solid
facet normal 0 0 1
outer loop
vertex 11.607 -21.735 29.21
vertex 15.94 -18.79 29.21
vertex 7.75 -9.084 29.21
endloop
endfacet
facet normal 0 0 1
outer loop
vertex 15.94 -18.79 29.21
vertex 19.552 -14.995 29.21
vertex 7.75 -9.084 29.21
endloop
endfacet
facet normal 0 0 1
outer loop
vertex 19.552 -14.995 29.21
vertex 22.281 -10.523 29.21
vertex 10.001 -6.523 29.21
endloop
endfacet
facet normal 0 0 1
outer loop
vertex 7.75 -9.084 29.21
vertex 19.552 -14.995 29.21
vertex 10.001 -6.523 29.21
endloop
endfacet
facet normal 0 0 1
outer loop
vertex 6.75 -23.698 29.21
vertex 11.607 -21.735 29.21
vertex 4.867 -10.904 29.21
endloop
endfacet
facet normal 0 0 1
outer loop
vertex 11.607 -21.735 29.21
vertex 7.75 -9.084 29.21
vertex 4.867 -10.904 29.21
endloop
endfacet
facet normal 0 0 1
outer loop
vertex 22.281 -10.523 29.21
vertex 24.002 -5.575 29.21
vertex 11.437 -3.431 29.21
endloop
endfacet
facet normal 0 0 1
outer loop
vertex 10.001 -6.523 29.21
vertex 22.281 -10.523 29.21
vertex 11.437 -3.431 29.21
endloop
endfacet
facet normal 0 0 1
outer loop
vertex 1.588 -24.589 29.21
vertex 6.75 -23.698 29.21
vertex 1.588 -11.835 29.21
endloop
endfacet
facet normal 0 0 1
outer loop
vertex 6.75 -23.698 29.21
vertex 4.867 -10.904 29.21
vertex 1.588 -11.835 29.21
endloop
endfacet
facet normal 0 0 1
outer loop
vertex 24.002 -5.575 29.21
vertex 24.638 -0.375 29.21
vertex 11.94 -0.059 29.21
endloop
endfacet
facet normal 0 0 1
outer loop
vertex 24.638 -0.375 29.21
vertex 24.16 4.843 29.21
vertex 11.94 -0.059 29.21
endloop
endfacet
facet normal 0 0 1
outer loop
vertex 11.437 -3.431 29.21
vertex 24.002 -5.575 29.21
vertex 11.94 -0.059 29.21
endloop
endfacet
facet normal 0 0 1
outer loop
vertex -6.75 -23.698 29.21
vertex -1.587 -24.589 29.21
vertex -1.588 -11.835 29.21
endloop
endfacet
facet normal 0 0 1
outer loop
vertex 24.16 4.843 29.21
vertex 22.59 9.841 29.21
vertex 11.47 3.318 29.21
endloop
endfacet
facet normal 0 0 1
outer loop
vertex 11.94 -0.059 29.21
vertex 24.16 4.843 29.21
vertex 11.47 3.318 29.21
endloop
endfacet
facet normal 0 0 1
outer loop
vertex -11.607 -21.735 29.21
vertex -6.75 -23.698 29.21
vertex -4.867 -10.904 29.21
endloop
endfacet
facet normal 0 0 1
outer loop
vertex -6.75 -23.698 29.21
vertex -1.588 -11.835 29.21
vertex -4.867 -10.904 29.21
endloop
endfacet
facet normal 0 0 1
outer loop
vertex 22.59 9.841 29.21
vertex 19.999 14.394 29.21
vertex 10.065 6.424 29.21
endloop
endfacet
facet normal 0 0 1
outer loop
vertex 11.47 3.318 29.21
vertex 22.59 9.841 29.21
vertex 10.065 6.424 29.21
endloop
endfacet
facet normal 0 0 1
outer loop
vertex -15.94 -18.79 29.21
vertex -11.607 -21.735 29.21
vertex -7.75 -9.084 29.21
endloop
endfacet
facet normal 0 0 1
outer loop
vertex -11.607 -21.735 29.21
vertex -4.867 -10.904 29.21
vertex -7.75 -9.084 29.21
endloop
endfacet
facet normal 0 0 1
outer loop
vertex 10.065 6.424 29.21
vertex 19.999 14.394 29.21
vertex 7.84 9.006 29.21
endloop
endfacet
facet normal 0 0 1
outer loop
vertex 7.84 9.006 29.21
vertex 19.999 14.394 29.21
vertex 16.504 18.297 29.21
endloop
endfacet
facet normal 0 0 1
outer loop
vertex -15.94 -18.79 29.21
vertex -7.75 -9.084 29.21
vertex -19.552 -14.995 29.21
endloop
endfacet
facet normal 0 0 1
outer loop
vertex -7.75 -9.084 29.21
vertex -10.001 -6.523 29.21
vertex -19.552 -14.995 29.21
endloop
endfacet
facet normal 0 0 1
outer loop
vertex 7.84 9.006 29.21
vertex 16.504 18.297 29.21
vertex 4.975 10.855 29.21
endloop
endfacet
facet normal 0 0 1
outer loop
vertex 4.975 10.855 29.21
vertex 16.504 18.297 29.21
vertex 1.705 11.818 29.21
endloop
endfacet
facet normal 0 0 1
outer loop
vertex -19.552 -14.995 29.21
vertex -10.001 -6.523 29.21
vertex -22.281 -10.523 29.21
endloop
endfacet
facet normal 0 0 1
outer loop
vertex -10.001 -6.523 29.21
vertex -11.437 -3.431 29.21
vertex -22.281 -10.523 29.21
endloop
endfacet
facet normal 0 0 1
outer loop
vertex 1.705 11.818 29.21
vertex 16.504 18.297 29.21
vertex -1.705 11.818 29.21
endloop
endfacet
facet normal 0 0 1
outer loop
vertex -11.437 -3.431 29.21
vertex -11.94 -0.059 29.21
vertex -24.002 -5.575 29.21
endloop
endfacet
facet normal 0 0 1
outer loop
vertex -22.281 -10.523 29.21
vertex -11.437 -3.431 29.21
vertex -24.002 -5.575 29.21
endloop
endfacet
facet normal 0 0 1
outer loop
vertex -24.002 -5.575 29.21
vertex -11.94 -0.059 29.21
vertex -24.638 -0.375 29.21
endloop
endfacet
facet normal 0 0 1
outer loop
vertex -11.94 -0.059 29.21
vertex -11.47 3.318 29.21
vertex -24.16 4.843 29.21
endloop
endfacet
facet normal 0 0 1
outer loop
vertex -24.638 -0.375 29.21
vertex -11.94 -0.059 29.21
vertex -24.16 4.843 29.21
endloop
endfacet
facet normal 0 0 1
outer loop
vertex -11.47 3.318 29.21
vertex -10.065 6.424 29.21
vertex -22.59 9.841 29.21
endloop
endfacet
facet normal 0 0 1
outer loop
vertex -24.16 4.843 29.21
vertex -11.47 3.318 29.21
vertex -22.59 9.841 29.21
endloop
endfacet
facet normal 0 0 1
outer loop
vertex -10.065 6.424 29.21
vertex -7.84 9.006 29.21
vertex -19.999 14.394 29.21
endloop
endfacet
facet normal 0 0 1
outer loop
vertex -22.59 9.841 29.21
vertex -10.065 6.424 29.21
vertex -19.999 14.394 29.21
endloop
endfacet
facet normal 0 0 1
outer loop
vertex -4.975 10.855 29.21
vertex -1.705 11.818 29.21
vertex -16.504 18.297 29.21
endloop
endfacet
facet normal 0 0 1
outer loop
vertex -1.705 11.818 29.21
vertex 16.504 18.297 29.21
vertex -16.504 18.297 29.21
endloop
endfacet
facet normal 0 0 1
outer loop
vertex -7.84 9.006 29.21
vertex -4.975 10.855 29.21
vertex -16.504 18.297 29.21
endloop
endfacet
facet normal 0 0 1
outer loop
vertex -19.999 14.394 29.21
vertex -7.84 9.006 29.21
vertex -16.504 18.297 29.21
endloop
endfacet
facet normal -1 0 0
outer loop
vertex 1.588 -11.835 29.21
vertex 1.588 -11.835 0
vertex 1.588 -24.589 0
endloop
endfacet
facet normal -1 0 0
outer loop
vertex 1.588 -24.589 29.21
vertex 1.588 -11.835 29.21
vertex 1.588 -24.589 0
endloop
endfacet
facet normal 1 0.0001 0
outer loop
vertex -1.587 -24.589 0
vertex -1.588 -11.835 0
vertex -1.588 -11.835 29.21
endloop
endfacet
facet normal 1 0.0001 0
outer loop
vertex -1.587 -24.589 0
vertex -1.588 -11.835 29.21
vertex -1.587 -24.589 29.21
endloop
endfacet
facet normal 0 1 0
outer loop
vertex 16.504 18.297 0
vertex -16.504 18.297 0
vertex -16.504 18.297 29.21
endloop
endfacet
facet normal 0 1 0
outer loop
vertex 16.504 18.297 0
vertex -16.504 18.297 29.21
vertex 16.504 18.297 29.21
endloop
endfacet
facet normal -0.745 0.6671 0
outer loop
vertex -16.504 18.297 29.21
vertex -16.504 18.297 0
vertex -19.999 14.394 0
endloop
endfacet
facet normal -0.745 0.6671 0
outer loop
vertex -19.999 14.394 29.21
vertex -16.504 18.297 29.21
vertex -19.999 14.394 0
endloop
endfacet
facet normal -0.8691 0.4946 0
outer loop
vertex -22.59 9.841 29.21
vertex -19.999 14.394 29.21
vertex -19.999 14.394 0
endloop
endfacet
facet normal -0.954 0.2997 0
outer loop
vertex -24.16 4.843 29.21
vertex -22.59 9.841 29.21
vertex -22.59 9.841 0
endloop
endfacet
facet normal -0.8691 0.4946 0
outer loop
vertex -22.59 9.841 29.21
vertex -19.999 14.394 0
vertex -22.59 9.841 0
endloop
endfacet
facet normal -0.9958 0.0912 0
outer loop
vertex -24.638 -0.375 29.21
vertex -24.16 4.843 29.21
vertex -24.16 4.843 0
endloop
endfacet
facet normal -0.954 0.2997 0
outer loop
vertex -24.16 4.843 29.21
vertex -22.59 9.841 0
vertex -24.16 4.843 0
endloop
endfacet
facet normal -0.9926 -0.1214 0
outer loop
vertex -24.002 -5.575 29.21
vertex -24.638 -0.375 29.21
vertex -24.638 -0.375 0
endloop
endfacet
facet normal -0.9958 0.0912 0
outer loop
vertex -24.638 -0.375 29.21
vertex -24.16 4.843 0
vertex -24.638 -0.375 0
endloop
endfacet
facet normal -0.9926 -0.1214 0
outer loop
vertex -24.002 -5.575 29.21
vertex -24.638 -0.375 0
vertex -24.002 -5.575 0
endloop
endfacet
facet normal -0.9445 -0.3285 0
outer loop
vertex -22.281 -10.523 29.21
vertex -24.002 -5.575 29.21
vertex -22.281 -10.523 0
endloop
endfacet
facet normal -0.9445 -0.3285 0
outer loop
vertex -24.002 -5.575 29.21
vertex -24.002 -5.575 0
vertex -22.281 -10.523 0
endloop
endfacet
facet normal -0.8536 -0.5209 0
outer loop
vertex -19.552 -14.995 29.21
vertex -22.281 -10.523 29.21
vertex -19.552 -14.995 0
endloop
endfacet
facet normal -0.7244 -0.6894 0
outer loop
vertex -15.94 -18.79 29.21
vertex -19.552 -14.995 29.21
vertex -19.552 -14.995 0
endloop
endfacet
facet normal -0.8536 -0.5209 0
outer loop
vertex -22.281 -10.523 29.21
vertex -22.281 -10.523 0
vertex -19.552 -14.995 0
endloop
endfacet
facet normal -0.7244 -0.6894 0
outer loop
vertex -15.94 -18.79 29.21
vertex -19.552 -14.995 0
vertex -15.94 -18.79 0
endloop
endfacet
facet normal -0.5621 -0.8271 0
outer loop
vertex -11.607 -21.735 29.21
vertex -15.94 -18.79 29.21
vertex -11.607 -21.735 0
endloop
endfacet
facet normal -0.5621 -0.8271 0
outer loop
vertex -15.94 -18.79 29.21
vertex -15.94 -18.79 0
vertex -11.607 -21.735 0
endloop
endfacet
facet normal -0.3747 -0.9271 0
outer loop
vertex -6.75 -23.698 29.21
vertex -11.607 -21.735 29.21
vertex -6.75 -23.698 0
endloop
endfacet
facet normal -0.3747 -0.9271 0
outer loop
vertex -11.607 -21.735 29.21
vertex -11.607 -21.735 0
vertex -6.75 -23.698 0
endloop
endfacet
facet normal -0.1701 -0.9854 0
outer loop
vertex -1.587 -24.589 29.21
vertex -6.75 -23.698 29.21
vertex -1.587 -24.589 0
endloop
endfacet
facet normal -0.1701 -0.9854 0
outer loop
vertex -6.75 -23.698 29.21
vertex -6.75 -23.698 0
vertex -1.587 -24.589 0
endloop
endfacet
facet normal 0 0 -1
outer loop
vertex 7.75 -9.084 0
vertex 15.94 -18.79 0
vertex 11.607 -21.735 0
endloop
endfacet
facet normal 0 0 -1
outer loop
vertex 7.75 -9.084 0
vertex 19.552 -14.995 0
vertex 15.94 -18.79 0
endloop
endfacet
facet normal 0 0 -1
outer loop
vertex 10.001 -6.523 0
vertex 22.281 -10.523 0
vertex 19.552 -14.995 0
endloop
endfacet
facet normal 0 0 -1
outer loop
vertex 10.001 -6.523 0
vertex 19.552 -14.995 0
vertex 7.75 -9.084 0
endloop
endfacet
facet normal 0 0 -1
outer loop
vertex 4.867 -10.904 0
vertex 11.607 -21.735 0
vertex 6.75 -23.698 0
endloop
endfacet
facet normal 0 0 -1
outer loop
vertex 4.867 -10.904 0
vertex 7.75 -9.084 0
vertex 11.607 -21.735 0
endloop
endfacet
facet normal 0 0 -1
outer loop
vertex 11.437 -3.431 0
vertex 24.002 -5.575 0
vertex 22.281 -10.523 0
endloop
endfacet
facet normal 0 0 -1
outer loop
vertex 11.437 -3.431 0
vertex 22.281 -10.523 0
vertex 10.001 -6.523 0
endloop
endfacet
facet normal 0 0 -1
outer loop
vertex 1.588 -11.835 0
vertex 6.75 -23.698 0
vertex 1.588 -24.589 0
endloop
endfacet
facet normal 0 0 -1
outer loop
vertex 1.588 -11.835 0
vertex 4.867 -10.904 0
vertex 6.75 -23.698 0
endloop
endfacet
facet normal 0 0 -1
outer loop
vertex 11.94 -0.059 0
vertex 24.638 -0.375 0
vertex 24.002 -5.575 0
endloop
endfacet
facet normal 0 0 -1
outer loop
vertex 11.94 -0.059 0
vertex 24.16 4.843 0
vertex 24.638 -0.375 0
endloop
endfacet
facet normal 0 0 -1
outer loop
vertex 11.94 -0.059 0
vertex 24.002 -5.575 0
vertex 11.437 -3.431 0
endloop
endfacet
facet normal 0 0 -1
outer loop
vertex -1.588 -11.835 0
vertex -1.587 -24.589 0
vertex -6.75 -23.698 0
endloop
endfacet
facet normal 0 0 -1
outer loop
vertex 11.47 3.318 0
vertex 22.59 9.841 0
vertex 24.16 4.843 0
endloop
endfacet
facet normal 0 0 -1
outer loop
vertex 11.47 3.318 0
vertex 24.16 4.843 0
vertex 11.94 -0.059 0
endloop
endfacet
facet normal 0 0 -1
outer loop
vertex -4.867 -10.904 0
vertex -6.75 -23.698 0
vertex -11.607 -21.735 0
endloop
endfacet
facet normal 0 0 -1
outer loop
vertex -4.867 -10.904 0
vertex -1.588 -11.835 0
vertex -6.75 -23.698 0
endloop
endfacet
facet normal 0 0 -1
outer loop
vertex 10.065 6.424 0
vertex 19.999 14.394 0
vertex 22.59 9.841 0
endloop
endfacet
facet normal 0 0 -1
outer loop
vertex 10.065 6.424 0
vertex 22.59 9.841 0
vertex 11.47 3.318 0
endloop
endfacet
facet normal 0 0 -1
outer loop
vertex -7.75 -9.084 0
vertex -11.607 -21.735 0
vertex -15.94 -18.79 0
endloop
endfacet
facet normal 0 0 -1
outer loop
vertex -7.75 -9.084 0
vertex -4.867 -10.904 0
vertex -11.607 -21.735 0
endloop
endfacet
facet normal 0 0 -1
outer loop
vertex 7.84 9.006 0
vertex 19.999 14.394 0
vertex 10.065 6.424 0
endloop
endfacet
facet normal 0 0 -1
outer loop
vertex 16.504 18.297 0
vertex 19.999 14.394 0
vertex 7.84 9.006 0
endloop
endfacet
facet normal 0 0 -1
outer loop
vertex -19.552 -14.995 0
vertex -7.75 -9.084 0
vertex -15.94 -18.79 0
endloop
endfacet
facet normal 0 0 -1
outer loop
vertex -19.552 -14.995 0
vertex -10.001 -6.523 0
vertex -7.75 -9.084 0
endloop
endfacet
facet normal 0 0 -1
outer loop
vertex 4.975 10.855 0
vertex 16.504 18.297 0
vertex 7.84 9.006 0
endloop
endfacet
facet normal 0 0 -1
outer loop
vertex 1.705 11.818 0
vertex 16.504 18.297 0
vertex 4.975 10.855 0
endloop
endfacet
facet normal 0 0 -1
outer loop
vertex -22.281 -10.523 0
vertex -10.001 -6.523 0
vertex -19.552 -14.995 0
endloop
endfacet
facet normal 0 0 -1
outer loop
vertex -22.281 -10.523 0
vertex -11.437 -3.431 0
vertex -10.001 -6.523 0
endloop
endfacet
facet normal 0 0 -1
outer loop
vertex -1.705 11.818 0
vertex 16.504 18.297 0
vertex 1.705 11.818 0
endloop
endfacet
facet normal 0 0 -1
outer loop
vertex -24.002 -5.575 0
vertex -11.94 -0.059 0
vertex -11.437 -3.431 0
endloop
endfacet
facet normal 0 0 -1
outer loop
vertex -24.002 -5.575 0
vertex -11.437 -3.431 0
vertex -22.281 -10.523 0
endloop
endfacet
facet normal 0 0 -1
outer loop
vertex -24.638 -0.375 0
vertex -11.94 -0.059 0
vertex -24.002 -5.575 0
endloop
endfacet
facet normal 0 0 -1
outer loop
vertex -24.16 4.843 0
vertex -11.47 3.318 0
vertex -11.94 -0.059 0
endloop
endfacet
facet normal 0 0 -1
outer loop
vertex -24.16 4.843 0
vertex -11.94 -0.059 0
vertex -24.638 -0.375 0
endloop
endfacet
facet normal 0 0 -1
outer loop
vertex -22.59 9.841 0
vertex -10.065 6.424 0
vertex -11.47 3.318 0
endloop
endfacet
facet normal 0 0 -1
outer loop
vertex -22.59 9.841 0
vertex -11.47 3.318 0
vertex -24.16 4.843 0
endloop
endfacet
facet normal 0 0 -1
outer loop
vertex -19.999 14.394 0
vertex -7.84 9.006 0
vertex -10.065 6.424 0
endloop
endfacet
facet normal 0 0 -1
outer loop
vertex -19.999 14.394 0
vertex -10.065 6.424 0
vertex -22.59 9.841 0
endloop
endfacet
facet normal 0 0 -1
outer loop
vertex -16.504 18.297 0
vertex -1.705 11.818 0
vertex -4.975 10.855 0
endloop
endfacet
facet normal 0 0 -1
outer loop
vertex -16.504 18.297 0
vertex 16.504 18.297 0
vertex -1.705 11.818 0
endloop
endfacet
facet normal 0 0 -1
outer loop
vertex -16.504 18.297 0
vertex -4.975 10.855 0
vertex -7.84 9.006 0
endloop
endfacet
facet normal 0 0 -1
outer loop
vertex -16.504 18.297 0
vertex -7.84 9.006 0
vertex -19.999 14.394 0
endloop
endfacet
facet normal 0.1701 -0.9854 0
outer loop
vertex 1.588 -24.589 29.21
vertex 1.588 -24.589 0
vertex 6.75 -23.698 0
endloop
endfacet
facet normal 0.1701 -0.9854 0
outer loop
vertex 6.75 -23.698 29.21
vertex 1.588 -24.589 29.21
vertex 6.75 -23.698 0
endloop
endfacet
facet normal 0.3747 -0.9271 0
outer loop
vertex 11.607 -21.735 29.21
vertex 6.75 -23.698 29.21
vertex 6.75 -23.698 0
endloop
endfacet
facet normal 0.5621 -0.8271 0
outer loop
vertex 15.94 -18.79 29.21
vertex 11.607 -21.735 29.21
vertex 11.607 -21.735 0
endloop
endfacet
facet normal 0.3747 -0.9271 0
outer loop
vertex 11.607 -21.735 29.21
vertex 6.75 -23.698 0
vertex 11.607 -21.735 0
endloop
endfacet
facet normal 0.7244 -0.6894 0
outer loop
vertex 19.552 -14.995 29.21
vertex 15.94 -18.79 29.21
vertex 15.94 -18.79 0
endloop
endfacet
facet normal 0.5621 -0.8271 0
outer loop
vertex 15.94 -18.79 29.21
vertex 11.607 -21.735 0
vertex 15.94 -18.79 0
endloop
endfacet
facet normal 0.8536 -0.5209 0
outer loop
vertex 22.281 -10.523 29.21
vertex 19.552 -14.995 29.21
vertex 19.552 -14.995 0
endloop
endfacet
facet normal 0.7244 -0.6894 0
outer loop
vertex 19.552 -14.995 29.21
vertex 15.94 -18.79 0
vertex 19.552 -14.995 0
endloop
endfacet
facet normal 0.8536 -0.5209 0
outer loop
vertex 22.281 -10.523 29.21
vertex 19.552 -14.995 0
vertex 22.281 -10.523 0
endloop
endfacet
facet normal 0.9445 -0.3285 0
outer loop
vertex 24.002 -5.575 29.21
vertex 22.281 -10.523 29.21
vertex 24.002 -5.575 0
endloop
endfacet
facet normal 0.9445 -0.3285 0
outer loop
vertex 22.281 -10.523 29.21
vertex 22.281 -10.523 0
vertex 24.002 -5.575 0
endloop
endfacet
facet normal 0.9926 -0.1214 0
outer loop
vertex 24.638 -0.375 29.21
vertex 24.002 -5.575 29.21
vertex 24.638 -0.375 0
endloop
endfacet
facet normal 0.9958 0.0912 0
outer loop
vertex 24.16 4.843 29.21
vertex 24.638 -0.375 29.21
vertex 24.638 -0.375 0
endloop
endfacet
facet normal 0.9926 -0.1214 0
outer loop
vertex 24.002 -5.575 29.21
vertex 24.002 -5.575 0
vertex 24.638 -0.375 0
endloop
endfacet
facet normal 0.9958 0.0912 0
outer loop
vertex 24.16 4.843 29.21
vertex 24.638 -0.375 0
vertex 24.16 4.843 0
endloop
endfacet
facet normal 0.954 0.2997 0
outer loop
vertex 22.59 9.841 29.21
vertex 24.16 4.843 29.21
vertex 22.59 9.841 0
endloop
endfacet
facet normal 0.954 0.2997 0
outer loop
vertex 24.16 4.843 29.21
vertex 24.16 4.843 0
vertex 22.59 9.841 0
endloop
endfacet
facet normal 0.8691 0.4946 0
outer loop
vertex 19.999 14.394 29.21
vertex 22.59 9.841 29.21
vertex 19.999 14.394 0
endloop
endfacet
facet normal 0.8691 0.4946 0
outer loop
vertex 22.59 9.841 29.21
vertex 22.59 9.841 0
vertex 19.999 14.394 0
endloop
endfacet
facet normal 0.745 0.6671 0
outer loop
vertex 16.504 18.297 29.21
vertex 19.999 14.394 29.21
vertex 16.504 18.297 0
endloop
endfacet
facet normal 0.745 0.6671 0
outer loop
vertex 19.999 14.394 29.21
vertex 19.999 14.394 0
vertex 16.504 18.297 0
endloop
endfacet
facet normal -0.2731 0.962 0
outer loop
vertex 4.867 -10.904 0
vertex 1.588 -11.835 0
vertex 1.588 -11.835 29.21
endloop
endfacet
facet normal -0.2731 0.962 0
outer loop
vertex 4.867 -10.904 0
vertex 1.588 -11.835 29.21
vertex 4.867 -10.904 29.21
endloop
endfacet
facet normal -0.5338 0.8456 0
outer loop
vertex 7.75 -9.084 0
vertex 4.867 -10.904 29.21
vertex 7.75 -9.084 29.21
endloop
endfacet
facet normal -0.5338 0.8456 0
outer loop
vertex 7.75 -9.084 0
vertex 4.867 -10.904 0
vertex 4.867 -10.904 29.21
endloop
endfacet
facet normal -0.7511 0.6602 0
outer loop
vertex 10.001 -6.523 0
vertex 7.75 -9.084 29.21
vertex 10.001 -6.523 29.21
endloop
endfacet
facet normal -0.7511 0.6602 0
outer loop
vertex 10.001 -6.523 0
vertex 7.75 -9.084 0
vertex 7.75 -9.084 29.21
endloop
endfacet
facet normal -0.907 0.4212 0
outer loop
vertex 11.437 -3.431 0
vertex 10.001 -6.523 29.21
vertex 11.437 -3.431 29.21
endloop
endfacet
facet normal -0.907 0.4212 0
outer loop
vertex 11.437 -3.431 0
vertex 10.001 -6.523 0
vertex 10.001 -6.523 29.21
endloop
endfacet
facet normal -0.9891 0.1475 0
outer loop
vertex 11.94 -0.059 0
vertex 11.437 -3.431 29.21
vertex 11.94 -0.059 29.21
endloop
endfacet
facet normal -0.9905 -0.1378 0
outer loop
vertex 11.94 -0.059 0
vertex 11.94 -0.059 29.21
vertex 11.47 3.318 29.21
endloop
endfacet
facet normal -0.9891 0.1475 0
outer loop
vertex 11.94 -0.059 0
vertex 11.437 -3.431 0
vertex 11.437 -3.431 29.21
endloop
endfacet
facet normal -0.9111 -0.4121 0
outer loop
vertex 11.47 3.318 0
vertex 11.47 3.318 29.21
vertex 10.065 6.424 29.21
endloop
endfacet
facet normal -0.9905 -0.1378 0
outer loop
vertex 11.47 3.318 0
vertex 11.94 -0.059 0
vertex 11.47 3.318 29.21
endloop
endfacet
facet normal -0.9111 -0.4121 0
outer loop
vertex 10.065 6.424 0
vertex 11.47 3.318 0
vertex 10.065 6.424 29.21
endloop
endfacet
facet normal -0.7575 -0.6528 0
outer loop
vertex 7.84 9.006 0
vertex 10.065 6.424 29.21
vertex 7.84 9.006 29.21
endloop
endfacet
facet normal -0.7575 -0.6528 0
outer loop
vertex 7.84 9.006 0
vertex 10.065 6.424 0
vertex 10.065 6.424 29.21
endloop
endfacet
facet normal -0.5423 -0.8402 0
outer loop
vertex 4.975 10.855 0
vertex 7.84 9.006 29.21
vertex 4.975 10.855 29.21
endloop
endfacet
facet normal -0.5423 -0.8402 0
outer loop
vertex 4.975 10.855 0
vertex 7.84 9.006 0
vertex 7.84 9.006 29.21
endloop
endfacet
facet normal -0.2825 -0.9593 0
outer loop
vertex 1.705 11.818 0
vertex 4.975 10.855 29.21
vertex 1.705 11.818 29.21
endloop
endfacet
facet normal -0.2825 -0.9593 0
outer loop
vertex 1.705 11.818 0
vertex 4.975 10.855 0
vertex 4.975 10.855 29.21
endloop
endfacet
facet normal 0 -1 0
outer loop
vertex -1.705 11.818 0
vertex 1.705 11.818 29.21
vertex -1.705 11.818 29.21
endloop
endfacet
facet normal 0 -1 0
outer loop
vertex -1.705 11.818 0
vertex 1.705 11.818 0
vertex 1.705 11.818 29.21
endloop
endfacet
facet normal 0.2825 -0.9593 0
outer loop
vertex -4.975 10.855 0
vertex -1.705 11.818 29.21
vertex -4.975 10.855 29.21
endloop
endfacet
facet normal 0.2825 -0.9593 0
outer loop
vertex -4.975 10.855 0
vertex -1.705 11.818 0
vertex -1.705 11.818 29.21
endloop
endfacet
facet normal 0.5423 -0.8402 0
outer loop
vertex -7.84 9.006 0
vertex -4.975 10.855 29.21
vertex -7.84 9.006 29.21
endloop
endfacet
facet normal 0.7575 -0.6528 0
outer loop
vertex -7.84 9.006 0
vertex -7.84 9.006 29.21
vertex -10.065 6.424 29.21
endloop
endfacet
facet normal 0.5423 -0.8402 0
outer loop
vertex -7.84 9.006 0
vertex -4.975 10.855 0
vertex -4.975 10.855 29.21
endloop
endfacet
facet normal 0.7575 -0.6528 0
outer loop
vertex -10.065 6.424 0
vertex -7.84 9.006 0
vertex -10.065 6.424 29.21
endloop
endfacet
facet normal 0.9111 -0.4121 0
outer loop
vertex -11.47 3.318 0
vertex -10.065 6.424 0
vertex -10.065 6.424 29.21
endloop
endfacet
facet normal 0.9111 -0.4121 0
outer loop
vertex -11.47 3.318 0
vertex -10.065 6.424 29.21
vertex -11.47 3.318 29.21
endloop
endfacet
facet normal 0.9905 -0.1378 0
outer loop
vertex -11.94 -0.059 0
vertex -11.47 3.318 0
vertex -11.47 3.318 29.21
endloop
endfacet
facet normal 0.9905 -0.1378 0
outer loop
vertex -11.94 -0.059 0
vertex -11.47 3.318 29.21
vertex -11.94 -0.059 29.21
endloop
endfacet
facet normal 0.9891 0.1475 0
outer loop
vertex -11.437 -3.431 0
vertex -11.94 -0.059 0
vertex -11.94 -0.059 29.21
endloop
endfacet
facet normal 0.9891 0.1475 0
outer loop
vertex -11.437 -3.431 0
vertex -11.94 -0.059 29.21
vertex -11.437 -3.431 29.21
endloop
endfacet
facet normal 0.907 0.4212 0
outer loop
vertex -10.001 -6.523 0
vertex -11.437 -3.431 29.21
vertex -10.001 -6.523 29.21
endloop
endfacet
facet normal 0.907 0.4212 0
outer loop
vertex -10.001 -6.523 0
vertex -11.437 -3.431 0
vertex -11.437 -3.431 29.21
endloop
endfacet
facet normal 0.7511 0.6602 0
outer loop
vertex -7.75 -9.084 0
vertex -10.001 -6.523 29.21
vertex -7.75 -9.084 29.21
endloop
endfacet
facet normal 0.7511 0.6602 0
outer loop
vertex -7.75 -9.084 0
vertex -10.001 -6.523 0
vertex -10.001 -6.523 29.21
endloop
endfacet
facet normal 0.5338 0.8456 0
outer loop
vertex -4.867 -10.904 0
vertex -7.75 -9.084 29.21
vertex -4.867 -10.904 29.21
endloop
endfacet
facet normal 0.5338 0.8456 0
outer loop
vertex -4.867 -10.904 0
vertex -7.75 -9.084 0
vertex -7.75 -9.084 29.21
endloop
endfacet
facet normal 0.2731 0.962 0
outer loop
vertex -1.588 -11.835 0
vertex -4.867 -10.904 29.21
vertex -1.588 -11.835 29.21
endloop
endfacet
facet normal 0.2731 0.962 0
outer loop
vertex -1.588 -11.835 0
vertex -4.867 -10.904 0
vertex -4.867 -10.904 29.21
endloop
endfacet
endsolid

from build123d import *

# Parameters (mm, degrees)
PAD_DEPTH = 29.21


with BuildPart() as part:
    # Sketch → Pad (new body)
    with BuildSketch(Plane.XY):
        with BuildLine():
            ThreePointArc((1.5875, -11.83454), (0, 11.94054), (-1.5875, -11.83454))
            Line((-1.5875, -11.83454), (-1.5875, -24.589348))
            ThreePointArc((-16.504081, 18.296763), (-23.272966, -8.094767), (-1.5875, -24.589348))
            Line((-16.504081, 18.296763), (16.504081, 18.296763))
            ThreePointArc((1.5875, -24.589348), (23.272966, -8.094767), (16.504081, 18.296763))
            Line((1.5875, -11.83454), (1.5875, -24.589348))
        make_face()
    extrude(amount=PAD_DEPTH)


solid = part.part
